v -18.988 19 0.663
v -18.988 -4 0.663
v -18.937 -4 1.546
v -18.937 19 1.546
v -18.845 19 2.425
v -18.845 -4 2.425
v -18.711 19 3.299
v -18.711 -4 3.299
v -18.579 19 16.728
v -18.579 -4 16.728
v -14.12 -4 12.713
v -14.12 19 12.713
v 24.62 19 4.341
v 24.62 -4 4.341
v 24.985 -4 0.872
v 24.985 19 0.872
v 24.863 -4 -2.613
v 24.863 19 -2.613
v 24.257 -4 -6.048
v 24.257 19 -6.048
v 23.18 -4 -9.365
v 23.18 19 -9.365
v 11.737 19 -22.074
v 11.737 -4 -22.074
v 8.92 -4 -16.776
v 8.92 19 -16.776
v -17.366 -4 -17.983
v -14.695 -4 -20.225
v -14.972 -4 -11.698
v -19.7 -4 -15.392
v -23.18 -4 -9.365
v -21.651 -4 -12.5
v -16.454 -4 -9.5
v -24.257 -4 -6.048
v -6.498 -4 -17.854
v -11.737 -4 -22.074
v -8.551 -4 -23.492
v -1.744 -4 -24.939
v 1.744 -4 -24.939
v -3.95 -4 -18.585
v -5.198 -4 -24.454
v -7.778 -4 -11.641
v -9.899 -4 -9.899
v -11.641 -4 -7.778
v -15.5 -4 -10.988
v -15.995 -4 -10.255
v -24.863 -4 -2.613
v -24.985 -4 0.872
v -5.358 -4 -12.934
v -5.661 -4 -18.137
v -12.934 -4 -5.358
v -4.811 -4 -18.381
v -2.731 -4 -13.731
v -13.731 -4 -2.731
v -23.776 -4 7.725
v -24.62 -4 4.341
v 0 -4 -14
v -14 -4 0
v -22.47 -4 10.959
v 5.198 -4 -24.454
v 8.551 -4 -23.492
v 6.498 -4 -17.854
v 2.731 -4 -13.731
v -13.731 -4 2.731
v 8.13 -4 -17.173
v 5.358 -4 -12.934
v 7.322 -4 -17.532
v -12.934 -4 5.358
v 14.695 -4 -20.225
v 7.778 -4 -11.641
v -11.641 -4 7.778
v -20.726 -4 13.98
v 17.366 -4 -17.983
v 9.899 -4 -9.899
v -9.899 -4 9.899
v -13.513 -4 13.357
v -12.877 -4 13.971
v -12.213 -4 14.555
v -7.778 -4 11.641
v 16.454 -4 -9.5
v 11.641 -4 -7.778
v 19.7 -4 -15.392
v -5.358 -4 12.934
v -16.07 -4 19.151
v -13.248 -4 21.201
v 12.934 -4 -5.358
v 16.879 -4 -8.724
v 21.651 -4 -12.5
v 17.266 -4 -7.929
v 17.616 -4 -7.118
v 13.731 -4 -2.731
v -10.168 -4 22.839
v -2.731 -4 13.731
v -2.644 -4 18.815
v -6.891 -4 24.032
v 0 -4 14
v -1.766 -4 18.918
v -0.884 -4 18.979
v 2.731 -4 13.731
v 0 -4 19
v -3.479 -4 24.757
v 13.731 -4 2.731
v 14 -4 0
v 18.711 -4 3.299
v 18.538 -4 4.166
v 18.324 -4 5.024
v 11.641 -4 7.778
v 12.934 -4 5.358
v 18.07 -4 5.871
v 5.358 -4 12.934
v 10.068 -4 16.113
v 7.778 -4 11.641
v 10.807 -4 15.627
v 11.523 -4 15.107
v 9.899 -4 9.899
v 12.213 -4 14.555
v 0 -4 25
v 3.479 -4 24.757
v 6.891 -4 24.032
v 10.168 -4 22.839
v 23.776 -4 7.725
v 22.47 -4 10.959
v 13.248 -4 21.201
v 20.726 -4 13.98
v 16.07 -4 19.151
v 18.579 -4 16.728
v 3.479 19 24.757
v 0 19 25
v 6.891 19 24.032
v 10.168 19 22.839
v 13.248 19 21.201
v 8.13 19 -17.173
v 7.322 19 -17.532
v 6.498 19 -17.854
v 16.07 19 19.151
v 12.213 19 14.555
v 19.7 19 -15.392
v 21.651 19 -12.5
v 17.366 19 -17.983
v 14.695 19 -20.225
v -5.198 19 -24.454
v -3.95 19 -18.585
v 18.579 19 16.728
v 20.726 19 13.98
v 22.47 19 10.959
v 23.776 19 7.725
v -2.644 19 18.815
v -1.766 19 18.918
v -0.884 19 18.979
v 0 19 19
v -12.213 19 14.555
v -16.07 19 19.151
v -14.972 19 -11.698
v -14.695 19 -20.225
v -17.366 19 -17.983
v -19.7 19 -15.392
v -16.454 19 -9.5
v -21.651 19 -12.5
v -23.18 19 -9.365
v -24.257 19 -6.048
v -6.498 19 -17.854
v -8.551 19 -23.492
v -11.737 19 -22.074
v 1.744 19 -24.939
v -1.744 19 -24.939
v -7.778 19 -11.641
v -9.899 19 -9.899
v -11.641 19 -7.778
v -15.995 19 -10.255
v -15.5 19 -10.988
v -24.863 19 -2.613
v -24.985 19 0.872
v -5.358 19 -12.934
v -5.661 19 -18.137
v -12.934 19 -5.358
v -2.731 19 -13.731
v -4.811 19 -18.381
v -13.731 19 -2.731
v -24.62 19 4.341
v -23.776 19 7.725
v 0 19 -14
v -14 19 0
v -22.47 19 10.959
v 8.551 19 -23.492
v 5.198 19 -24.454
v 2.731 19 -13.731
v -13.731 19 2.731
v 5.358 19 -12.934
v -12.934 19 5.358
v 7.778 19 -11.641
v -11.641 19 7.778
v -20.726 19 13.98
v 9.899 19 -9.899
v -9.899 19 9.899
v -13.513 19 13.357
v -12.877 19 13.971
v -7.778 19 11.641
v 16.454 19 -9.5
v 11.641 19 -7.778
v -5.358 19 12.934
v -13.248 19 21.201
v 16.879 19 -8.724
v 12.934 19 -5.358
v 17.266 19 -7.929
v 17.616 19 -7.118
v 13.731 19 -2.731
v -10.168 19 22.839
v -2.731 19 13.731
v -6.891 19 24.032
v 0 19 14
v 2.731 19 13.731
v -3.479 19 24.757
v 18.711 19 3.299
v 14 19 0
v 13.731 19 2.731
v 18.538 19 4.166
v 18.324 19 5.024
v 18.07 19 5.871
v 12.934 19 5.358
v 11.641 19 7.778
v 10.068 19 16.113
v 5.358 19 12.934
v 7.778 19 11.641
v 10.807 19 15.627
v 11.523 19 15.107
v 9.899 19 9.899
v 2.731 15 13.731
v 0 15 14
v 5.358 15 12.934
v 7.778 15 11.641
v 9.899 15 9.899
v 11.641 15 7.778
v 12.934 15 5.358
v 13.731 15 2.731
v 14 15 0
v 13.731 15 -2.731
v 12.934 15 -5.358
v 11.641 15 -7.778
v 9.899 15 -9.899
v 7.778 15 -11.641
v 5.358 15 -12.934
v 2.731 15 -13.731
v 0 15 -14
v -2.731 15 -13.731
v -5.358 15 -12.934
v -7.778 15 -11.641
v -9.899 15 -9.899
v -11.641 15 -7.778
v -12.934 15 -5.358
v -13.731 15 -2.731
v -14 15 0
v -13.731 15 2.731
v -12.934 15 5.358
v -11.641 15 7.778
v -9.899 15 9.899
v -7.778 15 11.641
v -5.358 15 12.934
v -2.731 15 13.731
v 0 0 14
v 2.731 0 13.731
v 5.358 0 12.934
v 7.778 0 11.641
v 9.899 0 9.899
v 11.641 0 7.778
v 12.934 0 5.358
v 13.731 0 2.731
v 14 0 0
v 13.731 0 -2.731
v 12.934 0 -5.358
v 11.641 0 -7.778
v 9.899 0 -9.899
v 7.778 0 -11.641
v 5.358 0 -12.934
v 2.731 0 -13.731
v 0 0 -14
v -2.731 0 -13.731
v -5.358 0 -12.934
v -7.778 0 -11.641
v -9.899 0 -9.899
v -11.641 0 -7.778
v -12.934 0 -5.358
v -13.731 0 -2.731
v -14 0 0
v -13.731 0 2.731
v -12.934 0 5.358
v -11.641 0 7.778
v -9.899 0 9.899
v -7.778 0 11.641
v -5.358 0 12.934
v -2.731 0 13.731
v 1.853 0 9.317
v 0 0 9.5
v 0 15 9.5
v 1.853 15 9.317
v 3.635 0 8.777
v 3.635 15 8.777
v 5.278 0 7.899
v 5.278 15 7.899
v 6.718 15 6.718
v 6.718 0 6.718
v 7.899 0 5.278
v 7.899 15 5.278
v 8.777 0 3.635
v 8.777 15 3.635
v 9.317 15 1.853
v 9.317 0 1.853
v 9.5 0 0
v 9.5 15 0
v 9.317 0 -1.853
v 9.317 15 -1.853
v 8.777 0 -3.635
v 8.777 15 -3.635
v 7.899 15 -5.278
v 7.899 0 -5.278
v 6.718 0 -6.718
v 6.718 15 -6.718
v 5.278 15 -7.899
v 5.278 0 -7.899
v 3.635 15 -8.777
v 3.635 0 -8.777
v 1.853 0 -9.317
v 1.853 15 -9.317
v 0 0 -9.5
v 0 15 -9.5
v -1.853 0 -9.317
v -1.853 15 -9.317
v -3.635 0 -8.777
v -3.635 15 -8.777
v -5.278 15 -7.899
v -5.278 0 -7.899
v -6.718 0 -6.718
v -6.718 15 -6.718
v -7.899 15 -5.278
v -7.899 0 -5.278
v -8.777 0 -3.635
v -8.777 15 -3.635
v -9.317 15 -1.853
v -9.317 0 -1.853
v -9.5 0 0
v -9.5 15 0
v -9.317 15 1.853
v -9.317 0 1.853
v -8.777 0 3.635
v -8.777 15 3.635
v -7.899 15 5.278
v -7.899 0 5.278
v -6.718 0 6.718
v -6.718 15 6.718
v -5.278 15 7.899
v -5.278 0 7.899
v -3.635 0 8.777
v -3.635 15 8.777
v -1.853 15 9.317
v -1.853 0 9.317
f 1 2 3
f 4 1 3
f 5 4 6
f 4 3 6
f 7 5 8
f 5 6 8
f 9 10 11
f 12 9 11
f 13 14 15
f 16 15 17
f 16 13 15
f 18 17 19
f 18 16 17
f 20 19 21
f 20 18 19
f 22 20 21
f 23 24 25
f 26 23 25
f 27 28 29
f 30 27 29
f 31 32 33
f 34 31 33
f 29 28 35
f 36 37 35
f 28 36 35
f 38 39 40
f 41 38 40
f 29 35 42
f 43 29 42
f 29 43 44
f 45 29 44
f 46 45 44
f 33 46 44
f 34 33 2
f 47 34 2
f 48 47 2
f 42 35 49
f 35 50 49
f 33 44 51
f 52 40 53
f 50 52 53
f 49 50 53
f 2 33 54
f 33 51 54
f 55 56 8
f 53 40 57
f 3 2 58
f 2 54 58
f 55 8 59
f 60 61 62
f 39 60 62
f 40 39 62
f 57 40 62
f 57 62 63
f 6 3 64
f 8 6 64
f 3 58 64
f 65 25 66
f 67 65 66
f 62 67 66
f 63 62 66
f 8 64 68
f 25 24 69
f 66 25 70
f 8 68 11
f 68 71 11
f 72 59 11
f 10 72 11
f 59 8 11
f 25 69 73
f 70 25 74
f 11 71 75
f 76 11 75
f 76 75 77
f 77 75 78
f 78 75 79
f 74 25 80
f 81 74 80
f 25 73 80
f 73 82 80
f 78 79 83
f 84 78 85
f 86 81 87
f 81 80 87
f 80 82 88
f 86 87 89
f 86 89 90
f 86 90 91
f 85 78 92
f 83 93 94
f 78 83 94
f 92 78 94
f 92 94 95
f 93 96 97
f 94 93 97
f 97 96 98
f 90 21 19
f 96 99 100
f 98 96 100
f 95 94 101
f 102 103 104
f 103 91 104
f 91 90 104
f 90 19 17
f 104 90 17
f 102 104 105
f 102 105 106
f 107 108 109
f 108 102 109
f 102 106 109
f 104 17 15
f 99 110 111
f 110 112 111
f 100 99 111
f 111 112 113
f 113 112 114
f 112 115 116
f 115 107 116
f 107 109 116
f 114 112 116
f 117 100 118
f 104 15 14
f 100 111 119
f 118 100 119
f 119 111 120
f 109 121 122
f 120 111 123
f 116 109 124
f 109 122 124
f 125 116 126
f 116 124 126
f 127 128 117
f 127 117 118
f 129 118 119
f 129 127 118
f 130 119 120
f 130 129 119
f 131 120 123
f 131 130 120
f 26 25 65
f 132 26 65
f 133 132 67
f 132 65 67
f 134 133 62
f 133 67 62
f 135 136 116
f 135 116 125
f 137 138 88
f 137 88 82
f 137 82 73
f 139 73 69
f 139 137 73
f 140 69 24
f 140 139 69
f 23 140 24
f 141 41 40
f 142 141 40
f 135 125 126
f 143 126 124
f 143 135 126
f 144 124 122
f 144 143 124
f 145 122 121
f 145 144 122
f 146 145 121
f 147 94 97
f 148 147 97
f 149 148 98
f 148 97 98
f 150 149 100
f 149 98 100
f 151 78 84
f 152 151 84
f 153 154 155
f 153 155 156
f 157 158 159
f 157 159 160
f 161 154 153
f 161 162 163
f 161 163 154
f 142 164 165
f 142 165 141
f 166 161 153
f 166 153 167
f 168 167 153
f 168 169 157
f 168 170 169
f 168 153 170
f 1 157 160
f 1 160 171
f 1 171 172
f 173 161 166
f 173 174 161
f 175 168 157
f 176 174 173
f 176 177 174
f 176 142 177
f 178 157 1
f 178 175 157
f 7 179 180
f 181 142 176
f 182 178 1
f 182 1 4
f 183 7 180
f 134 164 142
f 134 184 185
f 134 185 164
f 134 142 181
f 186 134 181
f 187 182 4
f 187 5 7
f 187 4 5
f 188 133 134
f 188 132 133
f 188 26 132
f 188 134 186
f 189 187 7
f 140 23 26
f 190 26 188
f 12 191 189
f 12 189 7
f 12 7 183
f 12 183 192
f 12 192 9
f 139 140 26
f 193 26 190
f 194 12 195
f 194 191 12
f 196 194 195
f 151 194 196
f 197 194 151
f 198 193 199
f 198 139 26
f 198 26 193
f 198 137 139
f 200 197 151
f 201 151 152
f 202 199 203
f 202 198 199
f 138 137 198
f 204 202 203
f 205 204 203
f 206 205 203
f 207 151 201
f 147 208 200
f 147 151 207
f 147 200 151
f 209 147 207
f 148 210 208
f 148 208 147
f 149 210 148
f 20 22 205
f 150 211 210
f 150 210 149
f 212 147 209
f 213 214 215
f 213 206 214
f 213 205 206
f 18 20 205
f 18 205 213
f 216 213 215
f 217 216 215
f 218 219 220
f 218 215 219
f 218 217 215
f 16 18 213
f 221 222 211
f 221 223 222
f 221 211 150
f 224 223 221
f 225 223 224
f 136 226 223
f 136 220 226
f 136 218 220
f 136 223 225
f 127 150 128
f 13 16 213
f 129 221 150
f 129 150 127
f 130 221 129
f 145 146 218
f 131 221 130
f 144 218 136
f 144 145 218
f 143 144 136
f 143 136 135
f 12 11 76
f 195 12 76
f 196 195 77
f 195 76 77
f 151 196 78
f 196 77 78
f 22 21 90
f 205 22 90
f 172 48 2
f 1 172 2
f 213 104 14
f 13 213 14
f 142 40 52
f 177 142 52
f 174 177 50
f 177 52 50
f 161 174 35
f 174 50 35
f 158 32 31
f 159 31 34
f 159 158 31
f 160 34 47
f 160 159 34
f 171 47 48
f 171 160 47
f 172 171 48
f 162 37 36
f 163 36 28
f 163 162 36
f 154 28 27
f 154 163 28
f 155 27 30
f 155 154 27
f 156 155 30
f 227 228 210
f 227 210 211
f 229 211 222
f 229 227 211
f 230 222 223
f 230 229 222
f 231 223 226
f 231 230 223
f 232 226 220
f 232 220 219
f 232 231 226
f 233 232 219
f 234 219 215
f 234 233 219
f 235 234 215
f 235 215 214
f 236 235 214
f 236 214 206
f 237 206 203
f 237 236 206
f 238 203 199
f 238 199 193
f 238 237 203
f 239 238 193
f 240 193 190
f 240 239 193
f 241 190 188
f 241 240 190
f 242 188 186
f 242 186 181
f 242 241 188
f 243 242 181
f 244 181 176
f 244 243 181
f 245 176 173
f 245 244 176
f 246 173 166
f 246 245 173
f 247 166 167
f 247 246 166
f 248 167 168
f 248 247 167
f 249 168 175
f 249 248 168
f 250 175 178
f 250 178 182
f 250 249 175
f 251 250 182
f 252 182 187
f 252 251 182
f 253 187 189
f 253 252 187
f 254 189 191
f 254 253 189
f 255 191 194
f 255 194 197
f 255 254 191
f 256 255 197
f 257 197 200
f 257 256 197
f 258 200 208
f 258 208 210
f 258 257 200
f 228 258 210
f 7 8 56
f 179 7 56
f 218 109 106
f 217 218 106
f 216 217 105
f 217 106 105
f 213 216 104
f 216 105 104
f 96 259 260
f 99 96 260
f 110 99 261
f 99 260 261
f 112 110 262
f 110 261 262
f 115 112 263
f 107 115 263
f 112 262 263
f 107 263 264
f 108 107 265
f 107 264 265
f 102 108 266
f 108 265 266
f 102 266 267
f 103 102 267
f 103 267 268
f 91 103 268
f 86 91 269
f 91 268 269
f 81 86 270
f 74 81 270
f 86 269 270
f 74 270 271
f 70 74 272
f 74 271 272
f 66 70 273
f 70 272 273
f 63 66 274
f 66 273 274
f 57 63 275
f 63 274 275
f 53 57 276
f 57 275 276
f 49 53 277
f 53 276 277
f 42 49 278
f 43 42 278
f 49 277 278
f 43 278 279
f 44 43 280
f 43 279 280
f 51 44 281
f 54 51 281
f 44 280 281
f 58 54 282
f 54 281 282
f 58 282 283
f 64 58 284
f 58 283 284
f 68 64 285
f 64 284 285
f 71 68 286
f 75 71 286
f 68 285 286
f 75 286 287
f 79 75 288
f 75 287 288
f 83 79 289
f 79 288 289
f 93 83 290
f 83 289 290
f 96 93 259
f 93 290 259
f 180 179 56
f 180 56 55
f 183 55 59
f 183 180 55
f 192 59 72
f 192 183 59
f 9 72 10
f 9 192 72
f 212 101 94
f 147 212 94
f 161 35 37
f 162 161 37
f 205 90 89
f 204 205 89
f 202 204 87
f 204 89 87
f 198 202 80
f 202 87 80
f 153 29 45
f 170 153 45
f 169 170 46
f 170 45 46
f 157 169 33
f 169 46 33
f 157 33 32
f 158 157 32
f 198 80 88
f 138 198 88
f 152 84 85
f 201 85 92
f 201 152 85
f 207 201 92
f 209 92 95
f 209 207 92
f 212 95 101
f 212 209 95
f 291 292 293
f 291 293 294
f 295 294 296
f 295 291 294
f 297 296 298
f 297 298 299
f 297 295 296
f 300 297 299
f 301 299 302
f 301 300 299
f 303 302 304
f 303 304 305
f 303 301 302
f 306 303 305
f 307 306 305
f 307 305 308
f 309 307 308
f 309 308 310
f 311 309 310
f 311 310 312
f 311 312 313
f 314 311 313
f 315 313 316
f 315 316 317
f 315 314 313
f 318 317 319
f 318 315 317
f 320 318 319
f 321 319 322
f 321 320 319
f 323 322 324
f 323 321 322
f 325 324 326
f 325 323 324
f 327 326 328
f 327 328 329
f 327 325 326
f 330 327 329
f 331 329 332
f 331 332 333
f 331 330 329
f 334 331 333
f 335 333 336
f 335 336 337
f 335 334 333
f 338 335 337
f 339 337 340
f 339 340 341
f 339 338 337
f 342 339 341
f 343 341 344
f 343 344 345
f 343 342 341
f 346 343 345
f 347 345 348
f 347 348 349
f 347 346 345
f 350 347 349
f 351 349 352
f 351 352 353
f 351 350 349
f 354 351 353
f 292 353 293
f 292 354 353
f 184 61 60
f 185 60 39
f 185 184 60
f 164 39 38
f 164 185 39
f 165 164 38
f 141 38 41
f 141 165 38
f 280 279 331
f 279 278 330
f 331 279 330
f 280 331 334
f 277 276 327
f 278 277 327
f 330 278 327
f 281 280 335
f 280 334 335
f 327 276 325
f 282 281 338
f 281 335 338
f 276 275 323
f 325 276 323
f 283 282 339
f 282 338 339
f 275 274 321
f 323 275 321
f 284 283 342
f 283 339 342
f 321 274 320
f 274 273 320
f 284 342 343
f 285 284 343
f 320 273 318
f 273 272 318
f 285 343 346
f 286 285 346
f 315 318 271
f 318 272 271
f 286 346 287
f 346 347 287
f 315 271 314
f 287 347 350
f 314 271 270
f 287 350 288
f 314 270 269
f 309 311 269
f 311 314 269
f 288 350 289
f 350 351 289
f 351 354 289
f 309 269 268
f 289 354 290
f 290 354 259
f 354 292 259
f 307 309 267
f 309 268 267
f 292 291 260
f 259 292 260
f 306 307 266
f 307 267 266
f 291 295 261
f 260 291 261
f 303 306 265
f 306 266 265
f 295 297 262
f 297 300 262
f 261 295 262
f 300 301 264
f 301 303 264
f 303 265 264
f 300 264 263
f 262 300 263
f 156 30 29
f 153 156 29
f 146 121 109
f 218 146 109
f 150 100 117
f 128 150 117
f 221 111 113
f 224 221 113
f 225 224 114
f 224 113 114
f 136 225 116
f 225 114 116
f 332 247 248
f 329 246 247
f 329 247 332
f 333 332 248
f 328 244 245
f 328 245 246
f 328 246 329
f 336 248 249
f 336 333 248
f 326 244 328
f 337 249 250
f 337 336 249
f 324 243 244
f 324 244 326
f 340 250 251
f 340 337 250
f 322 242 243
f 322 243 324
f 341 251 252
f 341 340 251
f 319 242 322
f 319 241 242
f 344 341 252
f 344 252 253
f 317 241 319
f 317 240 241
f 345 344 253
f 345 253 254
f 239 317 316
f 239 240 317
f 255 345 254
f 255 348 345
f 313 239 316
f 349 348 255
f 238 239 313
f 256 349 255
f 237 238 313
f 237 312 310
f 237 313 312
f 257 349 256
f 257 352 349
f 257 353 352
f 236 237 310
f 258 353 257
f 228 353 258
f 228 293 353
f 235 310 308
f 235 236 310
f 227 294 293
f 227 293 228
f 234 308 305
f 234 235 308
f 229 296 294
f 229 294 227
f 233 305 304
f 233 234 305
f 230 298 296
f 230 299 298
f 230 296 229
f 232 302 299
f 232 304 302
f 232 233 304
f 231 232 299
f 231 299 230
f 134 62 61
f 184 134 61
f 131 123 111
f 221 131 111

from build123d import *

# Parameters (mm, degrees)
SKETCH1_R           = 25
SKETCH1_R_2         = 9.5
BOSS_EXTRUDE1_DEPTH = 15
SKETCH2_R           = 25
SKETCH2_R_2         = 14
BOSS_EXTRUDE2_DEPTH = 4
CUT_EXTRUDE1_DEPTH  = 43.178193418
CIRPATTERN1_COUNT   = 9


with BuildPart() as part:
    # Sketch1 → Boss-Extrude1 (new body)
    with BuildSketch(Plane(origin=(0, 0, 0), x_dir=(1, 0, 0), z_dir=(0, 1, 0))):
        with Locations(Location((0, 0, 0), (0, 0, 270))):
            Circle(SKETCH1_R)
        with Locations(Location((0, 0, 0), (0, 0, 270))):
            Circle(SKETCH1_R_2, mode=Mode.SUBTRACT)
    extrude(amount=BOSS_EXTRUDE1_DEPTH)

    # Sketch2 → Boss-Extrude2 (add)
    with BuildSketch(Plane(origin=(0, 15, 0), x_dir=(1, 0, 0), z_dir=(0, 1, 0))):
        with Locations(Location((0, 0, 0), (0, 0, 270))):
            Circle(SKETCH2_R)
        with Locations(Location((0, 0, 0), (0, 0, 270))):
            Circle(SKETCH2_R_2, mode=Mode.SUBTRACT)
    boss_extrude2 = extrude(amount=BOSS_EXTRUDE2_DEPTH)

    # Mirror1: Boss-Extrude2 across plane
    add(boss_extrude2.mirror(Plane.ZX.offset(7.5)))

    # Sketch6 → Cut-Extrude1 (cut, through all)
    with BuildSketch(Plane.XZ.offset(4)):
        with BuildLine():
            Line((-3.479327524, 24.756701719), (-2.644288918, 18.815093306))
            ThreePointArc((-2.644288918, 18.815093306), (-1.325373001, 18.953716955), (0, 19))
            Line((0, 19), (0, 25))
            ThreePointArc((0, 25), (-1.743911844, 24.939101256), (-3.479327524, 24.756701719))
        make_face()
    cut_extrude1 = extrude(amount=-CUT_EXTRUDE1_DEPTH, mode=Mode.SUBTRACT)

    # CirPattern1: Cut-Extrude1 ×9 about axis
    cirpattern1_axis = Axis((0, 0, 0), (0, 1, 0))
    for i in range(1, CIRPATTERN1_COUNT):
        add(cut_extrude1.rotate(cirpattern1_axis, i * 360 / CIRPATTERN1_COUNT), mode=Mode.SUBTRACT)


solid = part.part
